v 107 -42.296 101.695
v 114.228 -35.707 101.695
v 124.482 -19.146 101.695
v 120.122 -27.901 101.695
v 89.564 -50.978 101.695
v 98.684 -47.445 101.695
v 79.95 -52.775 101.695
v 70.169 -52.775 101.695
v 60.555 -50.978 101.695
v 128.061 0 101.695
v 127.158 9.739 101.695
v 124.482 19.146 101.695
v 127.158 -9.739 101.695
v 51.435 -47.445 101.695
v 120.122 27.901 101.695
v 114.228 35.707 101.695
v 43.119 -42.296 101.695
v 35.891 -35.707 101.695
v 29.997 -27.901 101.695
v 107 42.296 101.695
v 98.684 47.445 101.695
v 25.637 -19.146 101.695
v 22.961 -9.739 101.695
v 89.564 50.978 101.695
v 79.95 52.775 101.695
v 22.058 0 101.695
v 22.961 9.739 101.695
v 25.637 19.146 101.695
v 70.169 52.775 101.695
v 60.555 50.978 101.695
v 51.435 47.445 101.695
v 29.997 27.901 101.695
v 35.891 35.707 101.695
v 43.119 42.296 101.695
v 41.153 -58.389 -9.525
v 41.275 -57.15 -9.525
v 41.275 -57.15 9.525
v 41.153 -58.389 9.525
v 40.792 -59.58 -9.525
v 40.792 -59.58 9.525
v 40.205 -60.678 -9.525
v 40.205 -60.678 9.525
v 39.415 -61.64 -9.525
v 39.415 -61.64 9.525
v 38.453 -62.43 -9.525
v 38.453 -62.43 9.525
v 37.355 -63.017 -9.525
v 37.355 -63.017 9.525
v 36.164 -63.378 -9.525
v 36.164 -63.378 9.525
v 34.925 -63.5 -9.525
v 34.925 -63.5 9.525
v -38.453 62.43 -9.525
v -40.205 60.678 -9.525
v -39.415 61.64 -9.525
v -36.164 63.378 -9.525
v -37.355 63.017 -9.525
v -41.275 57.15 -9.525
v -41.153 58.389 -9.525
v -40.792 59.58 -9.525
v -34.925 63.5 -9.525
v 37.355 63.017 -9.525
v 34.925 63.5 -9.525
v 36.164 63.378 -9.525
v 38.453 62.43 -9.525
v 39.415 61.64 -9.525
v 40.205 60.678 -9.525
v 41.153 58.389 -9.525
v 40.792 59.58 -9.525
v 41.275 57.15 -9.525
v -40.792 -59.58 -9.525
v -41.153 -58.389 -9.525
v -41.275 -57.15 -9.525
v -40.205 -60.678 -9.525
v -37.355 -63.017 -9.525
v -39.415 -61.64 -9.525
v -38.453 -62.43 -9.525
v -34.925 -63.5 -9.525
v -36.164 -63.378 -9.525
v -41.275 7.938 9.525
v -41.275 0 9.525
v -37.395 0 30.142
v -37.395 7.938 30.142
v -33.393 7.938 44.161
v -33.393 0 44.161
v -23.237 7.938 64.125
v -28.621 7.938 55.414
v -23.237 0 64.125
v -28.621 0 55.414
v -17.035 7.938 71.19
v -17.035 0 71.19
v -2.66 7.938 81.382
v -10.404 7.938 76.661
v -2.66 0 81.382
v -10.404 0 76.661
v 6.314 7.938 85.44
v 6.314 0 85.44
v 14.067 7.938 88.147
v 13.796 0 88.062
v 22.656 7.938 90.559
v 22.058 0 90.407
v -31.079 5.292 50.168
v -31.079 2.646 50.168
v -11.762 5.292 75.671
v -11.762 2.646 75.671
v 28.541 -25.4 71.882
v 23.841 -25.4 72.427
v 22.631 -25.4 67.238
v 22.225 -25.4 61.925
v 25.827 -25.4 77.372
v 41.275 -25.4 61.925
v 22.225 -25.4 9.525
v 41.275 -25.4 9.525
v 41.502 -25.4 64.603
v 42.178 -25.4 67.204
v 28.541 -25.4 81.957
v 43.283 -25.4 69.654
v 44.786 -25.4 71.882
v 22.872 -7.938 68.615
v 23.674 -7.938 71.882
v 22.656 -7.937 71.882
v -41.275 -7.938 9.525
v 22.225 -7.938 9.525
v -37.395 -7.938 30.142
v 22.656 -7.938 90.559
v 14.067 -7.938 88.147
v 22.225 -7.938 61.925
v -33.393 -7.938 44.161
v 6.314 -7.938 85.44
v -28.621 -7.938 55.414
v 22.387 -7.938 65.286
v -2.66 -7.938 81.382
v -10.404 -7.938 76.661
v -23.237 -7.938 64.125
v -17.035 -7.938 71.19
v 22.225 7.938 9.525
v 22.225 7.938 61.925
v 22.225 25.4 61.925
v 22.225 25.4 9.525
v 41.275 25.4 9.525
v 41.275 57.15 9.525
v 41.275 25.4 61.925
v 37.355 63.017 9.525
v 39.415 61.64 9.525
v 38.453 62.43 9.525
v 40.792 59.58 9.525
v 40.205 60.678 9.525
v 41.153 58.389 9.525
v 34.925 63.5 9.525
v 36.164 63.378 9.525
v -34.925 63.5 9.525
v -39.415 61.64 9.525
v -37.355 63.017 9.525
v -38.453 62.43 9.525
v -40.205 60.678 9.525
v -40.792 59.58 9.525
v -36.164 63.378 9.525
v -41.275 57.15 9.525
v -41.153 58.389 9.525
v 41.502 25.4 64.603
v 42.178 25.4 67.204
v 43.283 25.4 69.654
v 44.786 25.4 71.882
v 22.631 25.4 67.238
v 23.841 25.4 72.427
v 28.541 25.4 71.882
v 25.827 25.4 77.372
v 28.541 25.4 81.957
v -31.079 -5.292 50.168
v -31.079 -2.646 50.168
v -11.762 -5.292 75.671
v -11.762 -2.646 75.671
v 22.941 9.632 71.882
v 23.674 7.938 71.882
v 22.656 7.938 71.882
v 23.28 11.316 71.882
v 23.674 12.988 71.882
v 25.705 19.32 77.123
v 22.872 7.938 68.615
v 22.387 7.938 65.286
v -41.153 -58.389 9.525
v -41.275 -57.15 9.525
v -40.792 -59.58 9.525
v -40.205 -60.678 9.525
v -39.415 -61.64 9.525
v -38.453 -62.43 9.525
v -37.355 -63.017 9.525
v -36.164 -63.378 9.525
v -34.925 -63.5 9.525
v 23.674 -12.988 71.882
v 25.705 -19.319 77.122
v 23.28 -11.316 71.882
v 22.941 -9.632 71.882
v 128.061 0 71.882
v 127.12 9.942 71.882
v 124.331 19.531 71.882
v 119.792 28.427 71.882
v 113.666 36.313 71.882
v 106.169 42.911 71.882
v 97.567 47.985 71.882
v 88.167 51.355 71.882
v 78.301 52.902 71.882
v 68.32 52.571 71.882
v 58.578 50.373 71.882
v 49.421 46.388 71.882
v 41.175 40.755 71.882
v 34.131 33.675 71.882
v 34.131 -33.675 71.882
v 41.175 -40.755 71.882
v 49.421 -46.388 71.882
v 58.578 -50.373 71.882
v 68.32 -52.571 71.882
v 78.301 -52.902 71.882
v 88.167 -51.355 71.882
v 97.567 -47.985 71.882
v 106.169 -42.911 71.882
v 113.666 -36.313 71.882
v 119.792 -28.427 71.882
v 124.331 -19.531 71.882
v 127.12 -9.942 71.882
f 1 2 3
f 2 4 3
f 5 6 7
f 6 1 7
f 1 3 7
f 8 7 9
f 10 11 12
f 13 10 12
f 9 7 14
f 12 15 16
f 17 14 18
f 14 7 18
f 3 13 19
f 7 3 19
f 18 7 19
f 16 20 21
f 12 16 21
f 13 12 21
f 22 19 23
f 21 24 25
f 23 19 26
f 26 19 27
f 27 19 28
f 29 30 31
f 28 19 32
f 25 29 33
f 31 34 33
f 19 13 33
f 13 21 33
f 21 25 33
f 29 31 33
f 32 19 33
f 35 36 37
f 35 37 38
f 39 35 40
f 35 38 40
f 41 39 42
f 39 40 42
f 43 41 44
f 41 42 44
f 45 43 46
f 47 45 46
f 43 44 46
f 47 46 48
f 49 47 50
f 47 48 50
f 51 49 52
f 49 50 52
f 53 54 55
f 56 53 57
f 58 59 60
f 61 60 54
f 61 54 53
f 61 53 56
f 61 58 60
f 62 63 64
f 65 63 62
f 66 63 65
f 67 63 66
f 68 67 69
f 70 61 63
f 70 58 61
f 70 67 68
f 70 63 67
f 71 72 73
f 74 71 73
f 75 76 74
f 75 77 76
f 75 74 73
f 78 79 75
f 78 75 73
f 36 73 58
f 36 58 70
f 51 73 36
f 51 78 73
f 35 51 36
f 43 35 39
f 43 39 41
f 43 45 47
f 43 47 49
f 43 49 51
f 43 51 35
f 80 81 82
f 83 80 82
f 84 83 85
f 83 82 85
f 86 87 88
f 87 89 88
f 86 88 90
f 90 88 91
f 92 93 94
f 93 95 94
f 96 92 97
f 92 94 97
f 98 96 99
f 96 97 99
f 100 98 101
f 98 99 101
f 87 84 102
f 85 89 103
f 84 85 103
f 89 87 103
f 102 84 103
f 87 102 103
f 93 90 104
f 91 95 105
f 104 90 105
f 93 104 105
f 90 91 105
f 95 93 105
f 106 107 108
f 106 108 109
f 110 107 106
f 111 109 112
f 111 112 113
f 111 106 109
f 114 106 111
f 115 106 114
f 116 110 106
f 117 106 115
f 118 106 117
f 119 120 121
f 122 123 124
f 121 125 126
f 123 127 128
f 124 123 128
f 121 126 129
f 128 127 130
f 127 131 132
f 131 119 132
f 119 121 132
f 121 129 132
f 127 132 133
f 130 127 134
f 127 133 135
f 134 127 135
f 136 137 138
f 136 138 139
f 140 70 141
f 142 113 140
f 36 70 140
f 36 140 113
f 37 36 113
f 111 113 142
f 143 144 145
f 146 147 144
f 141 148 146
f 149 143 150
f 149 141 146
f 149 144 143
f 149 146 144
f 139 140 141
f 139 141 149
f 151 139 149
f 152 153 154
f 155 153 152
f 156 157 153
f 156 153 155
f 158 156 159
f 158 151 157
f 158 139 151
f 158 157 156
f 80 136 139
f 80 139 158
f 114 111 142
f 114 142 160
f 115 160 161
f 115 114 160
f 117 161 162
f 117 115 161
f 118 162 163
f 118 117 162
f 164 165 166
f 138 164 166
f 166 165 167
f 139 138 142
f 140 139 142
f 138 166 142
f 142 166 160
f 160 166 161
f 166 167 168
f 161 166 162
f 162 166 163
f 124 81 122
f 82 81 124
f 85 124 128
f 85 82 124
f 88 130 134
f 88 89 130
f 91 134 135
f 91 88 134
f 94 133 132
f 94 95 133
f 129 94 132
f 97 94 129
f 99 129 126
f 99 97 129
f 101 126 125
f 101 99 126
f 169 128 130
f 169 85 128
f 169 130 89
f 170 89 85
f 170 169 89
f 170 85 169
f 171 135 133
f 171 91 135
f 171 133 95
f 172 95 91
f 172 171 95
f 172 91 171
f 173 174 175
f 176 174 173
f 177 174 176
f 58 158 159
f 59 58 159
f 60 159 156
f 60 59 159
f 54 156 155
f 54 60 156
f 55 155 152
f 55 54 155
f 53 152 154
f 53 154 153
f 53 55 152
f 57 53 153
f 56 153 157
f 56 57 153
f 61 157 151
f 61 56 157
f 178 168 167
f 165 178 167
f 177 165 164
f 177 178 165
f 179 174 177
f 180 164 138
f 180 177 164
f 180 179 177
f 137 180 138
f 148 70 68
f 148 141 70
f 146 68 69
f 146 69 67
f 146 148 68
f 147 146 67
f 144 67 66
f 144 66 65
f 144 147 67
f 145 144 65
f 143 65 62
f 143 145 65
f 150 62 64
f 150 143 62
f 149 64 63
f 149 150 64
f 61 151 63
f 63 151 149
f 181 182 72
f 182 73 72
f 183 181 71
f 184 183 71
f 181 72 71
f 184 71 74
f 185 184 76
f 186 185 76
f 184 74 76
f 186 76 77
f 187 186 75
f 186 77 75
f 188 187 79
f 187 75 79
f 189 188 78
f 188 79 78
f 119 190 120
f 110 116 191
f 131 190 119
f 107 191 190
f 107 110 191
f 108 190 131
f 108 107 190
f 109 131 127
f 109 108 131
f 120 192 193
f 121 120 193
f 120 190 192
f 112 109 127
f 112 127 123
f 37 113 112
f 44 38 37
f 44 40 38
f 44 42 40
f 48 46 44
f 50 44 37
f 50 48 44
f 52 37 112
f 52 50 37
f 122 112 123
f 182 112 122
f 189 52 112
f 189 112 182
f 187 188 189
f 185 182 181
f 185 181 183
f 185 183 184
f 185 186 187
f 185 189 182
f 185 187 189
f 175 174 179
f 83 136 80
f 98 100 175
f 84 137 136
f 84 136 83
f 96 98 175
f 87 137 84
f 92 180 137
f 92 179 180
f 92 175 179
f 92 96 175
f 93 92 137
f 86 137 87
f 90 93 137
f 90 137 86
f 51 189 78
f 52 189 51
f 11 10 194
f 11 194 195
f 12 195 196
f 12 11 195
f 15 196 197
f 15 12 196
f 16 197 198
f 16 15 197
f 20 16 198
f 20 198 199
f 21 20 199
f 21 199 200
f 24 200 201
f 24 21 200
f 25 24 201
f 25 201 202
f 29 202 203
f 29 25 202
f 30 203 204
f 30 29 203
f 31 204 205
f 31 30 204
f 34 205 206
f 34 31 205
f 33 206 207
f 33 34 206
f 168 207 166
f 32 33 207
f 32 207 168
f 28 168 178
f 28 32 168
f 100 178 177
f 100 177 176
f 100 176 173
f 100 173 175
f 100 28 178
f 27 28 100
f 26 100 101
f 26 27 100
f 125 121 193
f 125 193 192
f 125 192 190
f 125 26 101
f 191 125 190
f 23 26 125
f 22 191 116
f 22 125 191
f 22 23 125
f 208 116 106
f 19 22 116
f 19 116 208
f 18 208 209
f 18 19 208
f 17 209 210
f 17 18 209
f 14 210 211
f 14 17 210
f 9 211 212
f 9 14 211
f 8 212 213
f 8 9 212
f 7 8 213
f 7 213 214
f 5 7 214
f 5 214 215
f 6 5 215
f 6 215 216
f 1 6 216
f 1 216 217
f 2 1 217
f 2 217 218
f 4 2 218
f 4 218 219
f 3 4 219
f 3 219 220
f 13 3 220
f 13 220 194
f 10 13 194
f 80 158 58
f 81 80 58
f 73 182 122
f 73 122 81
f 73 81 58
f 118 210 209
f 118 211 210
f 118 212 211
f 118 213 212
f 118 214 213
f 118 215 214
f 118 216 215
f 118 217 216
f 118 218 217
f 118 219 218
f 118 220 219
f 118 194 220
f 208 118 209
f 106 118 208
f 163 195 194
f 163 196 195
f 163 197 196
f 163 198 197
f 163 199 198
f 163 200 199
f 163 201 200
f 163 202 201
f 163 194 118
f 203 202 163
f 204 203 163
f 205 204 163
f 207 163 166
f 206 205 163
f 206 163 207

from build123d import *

# Parameters (mm, degrees)
F1_DEPTH = 63.5
F2_DEPTH = 25.4
F3_DEPTH = 7.9375
F0_W     = 53.001129165
F0_H     = 29.8131351553
F5_R     = 6.35


with BuildPart() as f1:
    # F0 (on Front) → F1 (new body, symmetric)
    with BuildSketch(Plane.XZ):
        Polygon((22.225, 9.525), (-41.275, 9.525), (-41.275, -9.525), (41.275, -9.525), (41.275, 9.525), align=None)
    extrude(amount=F1_DEPTH, both=True)

    # F0 (on Front) → F2 (join, symmetric)
    with BuildSketch(Plane.XZ):
        with BuildLine():
            Line((22.225, 61.9252), (22.225, 9.525))
            Line((22.225, 9.525), (41.275, 9.525))
            Line((41.275, 9.525), (41.275, 61.9252))
            ThreePointArc((41.275, 61.9252), (45.9246798487, 73.1505201513), (57.15, 77.8002))
            Line((57.15, 77.8002), (74.9244145172, 77.8002))
            Line((74.9244145172, 77.8002), (74.9244145172, 96.8502))
            Line((74.9244145172, 96.8502), (57.15, 96.8502))
            add(Edge.make_bspline(
                [(47.222675354, 95.4095821859), (50.4096853914, 95.9076958448), (53.7170651414, 96.3865930832), (57.15, 96.8502)],
                knots=[125.3666616532, 125.3666616532, 125.3666616532, 125.3666616532, 131.5795241671, 131.5795241671, 131.5795241671, 131.5795241671], degree=3))
            ThreePointArc((47.222675354, 95.4095821859), (29.1636869322, 82.8183066591), (22.225, 61.9252))
        make_face()
    extrude(amount=F2_DEPTH, both=True)

    # F0 (on Front) → F3 (join, symmetric)
    with BuildSketch(Plane.XZ):
        with BuildLine():
            add(Edge.make_bspline(
                [(-41.275, 9.525), (-32.3844300355, 67.4827050573), (-17.0866197814, 85.3583624135), (47.222675354, 95.4095821859)],
                knots=[0, 0, 0, 0, 125.3666616532, 125.3666616532, 125.3666616532, 125.3666616532], degree=3))
            Line((-41.275, 9.525), (22.225, 9.525))
            Line((22.225, 9.525), (22.225, 61.9252))
            ThreePointArc((22.225, 61.9252), (29.1636869322, 82.8183066591), (47.222675354, 95.4095821859))
        make_face()
    extrude(amount=F3_DEPTH, both=True)

    # F0 (on Front) → F4 (revolve)
    with BuildSketch(Plane.XZ):
        with Locations((101.560038097, 86.7887464721)):
            Rectangle(F0_W, F0_H)
    revolve(axis=Axis((75.0594735146, 0, 86.7887464721), (0, 0, 1)))

    # F5
    f5_edges = [f1.edges().sort_by_distance(p)[0] for p in [
        (41.275, -63.5, 0),
        (-41.275, -63.5, 0),
        (41.275, 63.5, 0),
        (-41.275, 63.5, 0),
    ]]
    fillet(f5_edges, radius=F5_R)


solid = f1.part
